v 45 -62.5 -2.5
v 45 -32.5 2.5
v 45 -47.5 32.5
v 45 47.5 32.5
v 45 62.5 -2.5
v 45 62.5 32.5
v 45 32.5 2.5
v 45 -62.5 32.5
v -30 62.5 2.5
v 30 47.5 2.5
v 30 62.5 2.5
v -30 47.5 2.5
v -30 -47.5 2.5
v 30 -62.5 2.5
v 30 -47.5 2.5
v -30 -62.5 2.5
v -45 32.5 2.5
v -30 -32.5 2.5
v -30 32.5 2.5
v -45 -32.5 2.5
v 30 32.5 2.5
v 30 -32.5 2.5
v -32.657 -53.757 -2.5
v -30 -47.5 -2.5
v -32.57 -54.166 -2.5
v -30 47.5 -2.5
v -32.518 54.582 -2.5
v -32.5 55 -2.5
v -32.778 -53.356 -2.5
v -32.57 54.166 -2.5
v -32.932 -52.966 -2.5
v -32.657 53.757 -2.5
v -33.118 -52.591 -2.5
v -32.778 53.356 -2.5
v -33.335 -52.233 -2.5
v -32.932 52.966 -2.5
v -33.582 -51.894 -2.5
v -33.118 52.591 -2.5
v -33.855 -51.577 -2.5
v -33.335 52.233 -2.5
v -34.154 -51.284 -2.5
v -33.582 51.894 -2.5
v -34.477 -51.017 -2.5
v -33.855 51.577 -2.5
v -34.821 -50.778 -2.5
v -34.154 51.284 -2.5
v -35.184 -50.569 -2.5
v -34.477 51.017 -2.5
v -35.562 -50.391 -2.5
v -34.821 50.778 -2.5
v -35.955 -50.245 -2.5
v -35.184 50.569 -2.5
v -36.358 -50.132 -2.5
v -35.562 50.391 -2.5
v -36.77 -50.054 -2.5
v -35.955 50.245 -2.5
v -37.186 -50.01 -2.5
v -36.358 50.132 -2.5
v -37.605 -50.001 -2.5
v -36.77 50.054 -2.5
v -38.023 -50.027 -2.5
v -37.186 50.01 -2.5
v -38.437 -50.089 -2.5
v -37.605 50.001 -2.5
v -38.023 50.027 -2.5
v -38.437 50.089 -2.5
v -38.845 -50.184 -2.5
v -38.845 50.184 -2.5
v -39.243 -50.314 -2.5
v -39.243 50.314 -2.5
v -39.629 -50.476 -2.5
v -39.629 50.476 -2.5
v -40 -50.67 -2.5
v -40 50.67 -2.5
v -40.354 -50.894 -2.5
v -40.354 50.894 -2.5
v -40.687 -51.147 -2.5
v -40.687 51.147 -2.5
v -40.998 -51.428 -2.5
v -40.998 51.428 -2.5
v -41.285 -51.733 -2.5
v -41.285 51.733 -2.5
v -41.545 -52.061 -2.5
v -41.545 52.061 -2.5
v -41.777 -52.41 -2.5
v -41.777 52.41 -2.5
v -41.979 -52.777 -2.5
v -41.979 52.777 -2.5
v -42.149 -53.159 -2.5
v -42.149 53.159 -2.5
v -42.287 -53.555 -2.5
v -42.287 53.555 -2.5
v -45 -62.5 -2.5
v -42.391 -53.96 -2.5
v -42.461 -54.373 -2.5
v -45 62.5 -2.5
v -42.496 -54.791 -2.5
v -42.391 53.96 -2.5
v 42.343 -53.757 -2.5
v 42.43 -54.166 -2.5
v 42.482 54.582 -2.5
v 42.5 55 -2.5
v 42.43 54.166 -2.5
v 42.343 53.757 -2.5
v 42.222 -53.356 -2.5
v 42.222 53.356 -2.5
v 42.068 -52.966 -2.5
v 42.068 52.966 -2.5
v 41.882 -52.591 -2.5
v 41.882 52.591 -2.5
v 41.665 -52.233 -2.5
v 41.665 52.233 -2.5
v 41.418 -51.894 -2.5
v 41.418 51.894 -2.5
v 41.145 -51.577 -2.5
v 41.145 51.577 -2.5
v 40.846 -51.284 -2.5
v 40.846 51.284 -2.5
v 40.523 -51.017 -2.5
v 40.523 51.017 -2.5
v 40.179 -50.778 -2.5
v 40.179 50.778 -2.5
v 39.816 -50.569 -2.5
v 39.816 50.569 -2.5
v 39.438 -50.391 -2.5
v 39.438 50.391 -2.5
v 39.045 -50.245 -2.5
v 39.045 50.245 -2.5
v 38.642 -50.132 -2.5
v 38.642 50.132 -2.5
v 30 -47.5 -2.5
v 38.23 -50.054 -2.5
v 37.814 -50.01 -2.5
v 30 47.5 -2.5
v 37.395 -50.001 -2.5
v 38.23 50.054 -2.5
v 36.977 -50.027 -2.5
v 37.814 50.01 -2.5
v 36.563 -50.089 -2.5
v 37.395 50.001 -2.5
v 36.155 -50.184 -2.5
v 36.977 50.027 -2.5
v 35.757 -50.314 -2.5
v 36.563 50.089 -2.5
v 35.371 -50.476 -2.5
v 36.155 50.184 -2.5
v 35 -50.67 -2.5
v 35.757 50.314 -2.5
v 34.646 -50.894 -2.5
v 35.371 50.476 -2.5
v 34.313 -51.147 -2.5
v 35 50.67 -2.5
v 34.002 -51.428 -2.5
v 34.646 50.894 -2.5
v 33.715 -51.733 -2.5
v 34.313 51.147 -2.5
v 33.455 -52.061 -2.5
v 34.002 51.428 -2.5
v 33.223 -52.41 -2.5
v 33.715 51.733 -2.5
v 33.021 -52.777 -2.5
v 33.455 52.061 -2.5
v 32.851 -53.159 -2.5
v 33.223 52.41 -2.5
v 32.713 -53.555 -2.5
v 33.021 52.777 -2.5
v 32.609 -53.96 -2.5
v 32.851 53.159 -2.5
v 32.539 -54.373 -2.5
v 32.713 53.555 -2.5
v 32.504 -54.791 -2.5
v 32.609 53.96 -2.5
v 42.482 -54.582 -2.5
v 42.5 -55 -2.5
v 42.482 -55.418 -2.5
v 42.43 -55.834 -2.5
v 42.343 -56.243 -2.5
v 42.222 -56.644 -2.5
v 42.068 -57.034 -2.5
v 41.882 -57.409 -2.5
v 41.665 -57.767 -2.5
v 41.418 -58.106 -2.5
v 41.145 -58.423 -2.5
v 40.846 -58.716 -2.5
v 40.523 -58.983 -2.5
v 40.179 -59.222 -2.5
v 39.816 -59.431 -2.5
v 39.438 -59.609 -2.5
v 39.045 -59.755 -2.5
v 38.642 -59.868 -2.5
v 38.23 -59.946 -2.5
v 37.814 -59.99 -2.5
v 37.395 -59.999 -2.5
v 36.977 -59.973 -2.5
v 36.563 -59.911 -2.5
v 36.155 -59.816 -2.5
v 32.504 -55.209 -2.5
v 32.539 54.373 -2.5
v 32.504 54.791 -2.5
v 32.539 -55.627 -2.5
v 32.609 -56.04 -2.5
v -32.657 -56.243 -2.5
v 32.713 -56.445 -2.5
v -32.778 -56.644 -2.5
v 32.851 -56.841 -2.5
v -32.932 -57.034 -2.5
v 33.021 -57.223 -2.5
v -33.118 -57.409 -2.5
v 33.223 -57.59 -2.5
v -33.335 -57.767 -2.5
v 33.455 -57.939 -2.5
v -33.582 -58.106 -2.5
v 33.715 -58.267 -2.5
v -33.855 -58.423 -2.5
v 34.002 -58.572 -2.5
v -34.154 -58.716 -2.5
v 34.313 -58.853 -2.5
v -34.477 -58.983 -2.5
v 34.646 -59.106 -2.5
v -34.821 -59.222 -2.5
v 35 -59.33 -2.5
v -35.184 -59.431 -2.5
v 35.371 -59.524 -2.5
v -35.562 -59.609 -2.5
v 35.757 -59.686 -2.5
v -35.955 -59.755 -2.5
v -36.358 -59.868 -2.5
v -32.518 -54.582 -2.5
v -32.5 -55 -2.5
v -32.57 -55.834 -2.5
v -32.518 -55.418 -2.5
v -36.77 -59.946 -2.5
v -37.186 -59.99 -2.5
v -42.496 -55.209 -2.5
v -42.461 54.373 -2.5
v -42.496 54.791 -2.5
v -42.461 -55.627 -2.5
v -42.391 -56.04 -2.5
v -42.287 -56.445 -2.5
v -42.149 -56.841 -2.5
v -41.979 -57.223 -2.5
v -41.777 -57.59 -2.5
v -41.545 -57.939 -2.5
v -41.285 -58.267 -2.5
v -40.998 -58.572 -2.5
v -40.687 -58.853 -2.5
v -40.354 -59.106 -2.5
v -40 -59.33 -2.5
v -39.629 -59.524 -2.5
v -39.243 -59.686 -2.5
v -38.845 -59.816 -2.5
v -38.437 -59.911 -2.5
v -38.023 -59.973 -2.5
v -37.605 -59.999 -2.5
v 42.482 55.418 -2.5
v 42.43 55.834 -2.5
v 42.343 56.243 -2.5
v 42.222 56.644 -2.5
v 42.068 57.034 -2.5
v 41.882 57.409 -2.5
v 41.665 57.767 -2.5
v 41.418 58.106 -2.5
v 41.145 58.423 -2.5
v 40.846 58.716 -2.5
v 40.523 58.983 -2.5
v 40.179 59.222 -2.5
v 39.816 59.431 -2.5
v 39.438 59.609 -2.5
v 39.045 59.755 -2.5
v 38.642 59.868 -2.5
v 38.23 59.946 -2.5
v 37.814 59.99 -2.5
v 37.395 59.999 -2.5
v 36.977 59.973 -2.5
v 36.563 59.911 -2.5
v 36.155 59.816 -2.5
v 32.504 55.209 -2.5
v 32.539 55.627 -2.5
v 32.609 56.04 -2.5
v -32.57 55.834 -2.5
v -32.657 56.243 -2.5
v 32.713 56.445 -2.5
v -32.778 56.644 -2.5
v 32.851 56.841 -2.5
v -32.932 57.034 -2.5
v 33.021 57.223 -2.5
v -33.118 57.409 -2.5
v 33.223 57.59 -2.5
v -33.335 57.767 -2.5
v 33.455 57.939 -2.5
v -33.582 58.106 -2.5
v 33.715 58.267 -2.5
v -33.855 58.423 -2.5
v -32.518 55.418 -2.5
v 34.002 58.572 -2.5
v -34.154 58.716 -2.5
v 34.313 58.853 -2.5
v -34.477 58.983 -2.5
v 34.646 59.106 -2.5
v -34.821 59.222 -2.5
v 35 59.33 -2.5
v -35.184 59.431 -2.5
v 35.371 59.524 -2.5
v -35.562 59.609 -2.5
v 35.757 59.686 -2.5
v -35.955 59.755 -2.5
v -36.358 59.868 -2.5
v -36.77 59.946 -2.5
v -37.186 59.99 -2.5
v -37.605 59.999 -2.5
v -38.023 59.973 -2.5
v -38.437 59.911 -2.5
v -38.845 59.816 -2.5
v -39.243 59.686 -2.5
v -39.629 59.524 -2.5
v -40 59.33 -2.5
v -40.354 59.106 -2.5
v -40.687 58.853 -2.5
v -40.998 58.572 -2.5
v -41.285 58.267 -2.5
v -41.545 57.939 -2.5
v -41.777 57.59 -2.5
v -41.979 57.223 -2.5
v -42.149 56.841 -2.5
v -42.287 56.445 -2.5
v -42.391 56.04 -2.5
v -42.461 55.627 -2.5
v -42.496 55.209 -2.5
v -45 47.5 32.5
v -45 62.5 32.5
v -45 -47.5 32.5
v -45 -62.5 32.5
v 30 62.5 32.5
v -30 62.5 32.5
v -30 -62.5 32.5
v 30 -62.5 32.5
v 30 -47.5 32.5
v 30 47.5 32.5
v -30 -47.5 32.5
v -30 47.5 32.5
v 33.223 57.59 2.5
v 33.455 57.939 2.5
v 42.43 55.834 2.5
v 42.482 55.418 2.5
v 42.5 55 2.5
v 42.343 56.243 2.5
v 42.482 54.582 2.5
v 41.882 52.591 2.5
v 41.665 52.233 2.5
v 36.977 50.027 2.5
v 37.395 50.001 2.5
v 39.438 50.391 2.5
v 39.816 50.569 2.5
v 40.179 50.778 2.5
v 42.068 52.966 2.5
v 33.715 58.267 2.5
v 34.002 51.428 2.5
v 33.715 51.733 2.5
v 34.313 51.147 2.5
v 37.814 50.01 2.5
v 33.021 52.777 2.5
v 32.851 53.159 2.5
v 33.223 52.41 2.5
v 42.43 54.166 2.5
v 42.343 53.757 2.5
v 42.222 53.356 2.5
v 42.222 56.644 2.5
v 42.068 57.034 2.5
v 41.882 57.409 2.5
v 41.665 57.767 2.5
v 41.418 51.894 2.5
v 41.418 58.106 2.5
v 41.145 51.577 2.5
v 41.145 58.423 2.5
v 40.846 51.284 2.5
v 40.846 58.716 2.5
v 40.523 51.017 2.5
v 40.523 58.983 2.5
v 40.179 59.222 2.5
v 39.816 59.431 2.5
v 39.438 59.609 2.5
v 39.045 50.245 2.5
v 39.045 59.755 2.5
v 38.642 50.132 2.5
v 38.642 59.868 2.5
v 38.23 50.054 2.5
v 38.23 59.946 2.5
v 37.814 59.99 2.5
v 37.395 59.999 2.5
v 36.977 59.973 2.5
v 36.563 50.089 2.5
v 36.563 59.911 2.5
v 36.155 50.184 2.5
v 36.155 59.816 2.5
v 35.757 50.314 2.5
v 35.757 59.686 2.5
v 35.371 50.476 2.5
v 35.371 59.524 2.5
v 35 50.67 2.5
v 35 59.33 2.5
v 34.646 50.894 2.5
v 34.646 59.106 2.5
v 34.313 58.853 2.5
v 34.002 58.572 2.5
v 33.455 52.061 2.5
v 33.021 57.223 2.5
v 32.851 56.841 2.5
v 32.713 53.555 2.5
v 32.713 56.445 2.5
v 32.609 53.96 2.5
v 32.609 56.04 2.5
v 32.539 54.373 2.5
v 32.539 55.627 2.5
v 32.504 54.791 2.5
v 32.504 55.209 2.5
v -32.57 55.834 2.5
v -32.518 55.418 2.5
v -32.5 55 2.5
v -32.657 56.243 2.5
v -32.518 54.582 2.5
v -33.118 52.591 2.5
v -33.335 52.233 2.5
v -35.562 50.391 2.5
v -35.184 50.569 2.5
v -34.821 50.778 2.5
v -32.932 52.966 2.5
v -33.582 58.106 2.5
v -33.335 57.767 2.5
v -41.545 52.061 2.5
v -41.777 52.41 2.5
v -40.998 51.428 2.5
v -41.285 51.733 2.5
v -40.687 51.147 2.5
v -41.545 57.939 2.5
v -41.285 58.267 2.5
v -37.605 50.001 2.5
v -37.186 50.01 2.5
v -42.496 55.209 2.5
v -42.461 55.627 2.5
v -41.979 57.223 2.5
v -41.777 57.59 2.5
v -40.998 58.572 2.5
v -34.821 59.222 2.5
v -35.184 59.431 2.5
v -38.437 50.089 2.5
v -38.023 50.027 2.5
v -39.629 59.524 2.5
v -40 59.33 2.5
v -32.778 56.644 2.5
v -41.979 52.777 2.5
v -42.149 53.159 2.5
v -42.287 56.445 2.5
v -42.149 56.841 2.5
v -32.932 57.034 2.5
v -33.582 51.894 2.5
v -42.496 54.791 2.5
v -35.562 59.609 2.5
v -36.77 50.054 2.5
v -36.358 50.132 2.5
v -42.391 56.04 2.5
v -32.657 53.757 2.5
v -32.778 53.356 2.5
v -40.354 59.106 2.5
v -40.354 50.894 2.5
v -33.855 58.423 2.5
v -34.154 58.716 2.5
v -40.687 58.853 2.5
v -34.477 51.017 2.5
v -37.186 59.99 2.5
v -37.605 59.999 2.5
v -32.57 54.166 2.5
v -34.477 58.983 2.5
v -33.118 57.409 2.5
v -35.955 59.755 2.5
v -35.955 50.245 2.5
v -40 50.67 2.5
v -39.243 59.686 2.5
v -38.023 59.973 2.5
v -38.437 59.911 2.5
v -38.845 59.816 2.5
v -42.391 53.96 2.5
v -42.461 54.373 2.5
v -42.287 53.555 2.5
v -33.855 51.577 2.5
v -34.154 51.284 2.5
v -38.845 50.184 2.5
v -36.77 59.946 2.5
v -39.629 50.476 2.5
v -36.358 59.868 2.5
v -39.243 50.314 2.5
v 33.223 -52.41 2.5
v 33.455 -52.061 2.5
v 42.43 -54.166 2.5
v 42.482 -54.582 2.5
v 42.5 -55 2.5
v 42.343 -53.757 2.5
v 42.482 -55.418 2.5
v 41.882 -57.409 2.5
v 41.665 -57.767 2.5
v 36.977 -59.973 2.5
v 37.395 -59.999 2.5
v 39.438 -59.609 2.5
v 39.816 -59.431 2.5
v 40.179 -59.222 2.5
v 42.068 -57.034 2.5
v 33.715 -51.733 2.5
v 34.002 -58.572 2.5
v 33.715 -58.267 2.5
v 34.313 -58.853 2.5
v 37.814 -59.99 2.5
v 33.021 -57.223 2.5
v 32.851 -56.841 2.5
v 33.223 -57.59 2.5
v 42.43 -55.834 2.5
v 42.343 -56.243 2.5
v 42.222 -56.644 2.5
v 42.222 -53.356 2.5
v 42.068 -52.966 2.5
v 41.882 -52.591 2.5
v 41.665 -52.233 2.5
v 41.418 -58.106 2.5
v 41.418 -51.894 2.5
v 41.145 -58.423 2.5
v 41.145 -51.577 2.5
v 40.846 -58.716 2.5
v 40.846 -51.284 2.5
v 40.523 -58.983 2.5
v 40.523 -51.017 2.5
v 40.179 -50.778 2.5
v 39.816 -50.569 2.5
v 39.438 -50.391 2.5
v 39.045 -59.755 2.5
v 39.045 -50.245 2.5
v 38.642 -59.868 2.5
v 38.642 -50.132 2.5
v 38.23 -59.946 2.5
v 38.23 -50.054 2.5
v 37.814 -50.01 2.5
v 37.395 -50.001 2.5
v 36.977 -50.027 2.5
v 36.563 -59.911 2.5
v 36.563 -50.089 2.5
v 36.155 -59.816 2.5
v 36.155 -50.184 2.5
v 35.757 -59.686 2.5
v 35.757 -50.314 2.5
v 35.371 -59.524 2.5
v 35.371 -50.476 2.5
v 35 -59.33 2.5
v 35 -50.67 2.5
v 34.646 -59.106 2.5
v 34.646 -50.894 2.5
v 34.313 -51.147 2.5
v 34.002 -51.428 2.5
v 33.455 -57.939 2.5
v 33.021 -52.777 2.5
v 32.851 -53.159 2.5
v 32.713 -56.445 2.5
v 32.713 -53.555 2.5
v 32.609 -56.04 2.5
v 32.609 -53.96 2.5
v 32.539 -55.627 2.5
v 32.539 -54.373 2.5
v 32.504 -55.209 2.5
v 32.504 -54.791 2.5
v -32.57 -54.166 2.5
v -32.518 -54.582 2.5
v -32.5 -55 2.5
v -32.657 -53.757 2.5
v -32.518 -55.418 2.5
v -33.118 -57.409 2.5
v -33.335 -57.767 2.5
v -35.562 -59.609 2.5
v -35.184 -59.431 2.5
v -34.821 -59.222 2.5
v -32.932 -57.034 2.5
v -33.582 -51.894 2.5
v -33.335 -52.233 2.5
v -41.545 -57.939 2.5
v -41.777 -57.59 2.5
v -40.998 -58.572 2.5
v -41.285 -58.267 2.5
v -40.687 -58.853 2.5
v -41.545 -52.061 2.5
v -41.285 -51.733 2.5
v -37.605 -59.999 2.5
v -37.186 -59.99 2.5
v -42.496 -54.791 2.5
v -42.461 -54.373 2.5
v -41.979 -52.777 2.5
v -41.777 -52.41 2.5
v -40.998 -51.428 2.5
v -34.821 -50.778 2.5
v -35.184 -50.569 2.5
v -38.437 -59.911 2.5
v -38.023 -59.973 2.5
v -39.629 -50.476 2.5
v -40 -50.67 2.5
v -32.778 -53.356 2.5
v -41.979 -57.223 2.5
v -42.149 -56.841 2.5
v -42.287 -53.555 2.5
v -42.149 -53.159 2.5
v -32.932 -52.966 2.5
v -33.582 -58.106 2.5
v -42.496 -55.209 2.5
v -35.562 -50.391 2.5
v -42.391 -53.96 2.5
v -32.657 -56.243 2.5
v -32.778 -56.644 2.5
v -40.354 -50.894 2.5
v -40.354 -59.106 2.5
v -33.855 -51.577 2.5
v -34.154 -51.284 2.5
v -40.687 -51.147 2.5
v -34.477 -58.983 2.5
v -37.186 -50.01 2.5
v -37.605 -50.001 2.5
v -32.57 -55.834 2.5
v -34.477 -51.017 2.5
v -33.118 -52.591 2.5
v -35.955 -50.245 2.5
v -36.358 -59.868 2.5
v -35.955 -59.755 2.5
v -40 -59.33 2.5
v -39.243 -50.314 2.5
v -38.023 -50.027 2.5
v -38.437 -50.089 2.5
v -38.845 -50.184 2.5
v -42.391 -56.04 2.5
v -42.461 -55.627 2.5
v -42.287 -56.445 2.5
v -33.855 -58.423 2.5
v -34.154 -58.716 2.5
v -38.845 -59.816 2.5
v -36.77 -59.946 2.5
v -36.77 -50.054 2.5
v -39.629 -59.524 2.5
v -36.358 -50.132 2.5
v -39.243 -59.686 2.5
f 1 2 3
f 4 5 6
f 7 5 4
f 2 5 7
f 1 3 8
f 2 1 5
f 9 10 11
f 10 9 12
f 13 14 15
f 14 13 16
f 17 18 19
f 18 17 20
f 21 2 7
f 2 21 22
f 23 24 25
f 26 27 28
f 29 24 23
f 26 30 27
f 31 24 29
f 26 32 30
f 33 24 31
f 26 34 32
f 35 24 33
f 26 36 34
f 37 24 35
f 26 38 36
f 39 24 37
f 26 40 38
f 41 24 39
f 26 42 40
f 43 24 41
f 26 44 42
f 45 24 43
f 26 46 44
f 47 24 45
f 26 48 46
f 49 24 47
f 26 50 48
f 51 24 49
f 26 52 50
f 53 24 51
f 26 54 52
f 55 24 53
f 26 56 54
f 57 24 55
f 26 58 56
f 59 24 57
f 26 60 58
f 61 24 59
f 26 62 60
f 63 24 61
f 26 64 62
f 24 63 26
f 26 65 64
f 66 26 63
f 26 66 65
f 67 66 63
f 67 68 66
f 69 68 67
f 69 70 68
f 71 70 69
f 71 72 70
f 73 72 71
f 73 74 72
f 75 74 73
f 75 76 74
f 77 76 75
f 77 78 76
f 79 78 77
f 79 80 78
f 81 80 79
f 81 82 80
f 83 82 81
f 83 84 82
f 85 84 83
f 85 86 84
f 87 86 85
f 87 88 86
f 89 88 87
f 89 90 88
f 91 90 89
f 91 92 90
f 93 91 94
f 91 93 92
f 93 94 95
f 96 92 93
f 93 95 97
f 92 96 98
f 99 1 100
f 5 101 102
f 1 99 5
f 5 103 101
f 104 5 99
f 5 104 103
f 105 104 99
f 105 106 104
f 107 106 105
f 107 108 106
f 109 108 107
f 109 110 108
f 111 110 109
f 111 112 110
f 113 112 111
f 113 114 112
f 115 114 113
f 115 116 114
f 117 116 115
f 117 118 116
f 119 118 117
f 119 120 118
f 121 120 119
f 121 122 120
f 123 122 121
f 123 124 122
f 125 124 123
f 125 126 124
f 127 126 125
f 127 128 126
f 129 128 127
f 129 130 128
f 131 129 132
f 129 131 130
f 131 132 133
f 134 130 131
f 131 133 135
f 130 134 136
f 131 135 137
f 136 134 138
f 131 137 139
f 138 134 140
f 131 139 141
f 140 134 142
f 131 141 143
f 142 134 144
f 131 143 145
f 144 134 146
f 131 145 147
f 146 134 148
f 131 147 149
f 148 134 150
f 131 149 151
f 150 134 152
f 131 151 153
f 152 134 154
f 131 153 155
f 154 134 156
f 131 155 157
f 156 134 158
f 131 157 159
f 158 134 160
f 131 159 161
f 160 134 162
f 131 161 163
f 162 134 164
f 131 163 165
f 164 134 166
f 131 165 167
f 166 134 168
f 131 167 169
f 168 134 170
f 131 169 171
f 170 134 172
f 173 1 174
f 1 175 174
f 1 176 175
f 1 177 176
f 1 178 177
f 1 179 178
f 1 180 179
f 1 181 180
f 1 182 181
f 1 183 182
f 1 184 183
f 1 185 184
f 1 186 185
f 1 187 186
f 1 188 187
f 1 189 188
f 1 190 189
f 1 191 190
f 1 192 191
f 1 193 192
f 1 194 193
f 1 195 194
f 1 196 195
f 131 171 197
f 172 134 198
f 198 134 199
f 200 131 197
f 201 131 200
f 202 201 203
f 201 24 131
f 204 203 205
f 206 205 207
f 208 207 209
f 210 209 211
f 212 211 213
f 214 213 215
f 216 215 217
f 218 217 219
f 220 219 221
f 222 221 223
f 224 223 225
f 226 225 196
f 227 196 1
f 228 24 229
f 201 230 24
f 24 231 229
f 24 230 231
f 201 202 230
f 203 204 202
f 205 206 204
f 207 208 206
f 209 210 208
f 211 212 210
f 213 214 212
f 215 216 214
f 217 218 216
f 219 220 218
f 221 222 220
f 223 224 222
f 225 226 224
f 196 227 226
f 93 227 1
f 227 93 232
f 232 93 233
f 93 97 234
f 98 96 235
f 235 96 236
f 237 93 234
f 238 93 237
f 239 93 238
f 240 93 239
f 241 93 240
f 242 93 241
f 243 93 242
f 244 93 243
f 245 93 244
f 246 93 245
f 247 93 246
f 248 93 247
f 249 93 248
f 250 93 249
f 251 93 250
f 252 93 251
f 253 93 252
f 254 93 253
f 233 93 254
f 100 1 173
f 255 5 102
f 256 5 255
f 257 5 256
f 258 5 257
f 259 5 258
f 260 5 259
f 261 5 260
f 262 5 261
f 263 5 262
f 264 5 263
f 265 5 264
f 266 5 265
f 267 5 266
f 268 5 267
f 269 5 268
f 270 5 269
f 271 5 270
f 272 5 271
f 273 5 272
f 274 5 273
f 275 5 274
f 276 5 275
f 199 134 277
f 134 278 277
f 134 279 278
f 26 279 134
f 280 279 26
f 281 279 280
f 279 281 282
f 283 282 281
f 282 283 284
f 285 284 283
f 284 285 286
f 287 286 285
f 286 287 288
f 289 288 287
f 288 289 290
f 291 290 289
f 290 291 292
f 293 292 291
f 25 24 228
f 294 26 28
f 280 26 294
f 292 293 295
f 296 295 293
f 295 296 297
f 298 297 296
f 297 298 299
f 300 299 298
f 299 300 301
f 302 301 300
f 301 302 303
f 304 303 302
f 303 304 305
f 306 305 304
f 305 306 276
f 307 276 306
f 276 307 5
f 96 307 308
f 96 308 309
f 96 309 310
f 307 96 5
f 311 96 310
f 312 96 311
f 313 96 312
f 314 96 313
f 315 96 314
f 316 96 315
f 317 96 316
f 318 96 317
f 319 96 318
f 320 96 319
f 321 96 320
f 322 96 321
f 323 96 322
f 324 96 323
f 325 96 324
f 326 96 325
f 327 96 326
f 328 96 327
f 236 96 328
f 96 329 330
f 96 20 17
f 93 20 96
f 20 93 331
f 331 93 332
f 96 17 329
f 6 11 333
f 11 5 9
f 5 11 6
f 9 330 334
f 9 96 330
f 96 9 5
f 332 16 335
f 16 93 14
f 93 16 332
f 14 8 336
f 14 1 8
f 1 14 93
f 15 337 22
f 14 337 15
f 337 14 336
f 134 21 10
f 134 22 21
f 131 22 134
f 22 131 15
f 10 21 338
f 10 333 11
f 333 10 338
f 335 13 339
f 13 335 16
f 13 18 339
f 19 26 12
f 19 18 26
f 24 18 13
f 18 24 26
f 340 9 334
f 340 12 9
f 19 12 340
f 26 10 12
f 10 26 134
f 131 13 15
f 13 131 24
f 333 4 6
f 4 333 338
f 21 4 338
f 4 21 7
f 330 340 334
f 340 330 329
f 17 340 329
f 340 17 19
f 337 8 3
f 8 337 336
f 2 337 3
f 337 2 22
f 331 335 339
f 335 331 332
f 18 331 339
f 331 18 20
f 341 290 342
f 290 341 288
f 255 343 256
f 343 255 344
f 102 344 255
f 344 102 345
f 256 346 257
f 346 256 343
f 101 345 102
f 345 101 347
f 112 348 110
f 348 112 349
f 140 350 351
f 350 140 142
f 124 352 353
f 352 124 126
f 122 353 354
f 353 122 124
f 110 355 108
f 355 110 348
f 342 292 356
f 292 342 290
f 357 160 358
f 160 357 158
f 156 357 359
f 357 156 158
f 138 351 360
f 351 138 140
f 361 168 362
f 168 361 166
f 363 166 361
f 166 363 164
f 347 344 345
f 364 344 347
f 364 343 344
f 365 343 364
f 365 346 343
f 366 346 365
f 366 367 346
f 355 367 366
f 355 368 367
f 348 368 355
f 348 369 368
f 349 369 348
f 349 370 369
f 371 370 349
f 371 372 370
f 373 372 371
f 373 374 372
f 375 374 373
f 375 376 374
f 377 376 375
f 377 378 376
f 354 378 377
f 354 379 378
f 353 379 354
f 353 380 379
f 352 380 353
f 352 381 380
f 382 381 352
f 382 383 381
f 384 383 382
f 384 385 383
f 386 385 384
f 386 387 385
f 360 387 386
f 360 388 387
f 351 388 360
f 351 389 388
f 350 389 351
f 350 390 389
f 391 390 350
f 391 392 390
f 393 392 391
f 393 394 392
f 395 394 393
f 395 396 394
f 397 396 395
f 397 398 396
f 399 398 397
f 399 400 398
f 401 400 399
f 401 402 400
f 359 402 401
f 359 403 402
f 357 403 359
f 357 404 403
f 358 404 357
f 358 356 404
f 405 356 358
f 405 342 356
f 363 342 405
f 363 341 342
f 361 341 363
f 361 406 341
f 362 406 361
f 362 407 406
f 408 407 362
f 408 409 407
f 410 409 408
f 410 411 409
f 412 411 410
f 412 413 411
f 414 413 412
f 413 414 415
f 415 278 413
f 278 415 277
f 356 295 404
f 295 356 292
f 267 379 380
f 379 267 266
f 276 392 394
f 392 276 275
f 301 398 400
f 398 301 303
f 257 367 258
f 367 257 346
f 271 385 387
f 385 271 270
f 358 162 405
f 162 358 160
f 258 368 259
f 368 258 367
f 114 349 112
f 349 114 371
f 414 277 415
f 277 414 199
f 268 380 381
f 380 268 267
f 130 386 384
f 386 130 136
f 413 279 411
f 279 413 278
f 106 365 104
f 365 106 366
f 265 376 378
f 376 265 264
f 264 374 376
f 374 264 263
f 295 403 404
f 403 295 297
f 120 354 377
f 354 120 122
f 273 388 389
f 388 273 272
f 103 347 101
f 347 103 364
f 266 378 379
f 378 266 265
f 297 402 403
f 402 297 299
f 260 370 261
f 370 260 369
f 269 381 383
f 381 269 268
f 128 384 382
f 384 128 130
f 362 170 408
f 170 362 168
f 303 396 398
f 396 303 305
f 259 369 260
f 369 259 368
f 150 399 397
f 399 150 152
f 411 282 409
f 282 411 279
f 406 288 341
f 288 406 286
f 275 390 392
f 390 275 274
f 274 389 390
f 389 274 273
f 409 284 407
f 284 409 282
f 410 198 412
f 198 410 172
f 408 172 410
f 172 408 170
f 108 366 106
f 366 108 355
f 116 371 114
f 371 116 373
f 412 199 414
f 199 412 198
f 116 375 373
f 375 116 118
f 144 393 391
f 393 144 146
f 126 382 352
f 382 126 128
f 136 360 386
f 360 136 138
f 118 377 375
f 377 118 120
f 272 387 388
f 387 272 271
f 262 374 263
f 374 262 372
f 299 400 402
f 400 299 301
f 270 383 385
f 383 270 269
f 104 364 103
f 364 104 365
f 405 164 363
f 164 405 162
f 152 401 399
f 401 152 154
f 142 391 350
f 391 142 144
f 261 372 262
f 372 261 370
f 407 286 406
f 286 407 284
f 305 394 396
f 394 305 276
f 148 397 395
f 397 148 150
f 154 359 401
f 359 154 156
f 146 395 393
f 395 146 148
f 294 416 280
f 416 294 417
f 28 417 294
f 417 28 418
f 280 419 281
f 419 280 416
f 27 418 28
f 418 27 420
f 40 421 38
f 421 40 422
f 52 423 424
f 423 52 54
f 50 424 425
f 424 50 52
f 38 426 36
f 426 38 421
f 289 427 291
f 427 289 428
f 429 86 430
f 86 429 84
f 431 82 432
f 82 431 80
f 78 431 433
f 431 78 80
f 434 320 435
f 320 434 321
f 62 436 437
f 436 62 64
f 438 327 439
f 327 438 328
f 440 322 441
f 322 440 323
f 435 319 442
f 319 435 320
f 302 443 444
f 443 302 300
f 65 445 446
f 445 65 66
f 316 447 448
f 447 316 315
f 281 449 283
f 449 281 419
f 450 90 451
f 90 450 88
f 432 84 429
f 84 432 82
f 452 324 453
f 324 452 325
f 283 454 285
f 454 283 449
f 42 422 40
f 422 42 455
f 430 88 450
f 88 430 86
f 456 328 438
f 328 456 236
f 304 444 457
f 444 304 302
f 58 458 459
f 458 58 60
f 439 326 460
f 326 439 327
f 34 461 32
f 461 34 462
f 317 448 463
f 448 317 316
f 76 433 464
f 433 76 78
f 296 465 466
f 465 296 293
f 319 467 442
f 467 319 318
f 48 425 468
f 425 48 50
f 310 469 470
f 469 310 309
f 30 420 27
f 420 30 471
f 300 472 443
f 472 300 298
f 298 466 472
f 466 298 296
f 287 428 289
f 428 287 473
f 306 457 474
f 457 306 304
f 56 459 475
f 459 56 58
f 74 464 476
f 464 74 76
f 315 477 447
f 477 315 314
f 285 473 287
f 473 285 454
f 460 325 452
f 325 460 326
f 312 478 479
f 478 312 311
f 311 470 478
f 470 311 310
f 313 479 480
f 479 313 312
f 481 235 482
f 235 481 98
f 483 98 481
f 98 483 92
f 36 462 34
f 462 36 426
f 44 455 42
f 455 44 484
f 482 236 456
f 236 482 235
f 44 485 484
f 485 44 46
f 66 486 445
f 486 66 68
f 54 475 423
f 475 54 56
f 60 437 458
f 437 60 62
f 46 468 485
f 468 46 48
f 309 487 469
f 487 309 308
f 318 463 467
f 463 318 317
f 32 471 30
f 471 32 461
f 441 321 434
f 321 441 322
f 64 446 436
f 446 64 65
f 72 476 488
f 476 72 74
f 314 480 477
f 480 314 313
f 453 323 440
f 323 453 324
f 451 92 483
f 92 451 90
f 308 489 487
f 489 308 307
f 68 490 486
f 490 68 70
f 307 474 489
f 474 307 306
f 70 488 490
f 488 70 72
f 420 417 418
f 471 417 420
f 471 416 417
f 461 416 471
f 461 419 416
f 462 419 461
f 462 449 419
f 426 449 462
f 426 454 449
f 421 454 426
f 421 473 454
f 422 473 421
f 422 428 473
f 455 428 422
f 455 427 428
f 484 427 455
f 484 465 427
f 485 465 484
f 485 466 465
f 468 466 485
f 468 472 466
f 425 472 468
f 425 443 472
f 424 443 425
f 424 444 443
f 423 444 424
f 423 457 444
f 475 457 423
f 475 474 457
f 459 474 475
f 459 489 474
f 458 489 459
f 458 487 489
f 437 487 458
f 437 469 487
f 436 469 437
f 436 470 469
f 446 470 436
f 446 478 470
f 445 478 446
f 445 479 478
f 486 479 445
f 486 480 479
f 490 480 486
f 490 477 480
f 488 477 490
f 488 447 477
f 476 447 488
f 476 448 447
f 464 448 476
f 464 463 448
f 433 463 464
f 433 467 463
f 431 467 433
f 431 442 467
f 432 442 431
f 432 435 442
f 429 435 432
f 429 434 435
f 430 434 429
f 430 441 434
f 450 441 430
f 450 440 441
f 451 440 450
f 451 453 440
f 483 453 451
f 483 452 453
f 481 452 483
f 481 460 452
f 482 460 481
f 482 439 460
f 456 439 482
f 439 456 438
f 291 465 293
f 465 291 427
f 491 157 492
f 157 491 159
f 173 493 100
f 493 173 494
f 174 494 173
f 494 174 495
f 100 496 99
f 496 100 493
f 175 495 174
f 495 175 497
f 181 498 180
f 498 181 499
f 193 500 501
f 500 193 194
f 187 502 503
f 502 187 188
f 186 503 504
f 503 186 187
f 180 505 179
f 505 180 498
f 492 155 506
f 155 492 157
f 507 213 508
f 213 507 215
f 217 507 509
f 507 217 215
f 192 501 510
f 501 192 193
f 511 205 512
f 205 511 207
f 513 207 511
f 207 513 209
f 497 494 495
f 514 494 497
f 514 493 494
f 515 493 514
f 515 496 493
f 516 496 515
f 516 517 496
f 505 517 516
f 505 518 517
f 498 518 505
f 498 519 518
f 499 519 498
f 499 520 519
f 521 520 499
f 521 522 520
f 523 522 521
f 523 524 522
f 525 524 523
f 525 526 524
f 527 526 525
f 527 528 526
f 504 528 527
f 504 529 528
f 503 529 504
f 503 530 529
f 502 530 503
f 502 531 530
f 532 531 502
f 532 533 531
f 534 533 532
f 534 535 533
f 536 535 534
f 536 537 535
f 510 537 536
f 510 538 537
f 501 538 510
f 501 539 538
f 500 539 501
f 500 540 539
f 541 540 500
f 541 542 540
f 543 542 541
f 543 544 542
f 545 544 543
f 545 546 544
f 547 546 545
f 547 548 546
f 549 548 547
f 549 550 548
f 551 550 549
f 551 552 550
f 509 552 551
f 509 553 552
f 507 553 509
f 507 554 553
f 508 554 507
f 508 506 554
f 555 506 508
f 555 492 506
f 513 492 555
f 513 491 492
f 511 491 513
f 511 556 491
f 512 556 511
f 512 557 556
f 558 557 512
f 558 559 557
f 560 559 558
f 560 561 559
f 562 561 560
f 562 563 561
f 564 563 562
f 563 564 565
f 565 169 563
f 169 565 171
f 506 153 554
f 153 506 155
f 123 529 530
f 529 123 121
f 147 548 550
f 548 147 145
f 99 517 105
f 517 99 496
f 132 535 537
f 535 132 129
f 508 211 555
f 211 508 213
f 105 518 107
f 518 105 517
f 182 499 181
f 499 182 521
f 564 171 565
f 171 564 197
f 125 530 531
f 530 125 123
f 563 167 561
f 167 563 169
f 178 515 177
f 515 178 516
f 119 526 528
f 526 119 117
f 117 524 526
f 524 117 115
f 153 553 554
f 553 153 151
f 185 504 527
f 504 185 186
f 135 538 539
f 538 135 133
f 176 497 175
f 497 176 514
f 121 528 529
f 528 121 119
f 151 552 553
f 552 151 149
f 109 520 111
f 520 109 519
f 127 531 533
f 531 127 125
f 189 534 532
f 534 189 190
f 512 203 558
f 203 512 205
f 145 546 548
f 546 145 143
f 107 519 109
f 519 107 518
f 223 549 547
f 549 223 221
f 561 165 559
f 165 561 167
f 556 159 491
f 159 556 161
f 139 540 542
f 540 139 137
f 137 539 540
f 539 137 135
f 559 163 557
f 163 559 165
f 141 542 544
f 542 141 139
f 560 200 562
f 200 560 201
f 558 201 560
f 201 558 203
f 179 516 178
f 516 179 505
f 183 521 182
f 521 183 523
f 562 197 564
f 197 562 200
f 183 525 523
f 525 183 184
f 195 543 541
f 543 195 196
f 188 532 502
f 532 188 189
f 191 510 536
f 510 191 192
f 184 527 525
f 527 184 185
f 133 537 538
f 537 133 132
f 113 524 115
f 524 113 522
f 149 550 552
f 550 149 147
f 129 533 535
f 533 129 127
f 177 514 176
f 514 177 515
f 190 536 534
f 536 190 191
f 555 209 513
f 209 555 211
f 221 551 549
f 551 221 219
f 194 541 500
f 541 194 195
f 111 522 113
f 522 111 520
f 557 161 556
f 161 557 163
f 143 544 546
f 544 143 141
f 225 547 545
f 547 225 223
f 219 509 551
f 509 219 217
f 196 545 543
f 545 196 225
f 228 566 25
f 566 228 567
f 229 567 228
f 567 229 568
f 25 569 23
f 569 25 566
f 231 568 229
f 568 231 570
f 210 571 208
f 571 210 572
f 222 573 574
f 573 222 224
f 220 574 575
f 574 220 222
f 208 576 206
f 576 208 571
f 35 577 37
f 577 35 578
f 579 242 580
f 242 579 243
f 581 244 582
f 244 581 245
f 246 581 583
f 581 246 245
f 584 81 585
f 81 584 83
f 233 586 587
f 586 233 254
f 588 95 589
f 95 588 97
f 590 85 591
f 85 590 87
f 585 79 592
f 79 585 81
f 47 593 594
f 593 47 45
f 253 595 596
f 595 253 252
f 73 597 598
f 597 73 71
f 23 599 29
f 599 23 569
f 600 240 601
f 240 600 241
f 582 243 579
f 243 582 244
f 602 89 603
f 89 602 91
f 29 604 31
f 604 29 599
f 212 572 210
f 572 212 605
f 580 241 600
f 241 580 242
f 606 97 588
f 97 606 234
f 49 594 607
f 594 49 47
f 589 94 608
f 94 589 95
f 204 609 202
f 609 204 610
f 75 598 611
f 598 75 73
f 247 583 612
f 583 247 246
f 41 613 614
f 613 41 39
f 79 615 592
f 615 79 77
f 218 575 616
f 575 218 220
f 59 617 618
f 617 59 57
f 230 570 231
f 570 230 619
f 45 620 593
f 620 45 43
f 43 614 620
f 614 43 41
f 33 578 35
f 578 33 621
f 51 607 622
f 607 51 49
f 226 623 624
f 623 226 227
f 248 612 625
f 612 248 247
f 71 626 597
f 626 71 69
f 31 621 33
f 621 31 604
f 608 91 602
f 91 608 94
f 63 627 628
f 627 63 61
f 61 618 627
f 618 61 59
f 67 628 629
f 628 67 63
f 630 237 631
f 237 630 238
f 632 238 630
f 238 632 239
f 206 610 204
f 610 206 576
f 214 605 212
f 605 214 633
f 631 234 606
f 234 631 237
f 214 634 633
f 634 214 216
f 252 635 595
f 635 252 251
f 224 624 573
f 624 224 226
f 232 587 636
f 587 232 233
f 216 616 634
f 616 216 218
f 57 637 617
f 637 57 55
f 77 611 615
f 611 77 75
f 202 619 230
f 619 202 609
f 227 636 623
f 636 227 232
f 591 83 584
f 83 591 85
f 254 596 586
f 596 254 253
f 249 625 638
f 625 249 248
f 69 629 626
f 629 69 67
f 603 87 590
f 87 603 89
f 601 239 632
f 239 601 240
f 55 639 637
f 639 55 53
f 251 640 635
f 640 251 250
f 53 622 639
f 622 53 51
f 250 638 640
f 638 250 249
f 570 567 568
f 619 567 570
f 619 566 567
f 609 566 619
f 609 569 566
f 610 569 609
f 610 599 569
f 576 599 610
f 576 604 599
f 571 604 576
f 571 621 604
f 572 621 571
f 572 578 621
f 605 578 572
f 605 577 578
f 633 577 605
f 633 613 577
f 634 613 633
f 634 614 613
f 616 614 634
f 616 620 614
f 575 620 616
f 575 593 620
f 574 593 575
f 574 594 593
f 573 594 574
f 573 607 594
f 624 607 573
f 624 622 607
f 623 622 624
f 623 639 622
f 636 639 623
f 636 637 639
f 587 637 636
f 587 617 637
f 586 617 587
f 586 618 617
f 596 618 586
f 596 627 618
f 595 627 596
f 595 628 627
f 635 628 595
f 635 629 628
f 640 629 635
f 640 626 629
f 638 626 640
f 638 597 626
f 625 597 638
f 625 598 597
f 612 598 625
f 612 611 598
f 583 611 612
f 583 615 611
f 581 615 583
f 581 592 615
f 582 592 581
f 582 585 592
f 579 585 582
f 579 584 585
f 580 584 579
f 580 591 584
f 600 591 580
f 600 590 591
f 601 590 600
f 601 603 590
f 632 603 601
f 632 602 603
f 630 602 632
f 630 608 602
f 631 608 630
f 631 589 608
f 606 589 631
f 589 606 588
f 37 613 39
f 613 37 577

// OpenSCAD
/*
 * Stand for my amplifier (Fosi Audio V3) to make it rest
 * comfortably on my desk lifted over my monitor stand.
 */

// PARAMETERS

frame_x = 90; // mm
frame_y = 125; // mm
frame_z = 5; // mm
frame_thickness = 15; // mm

indent_offset = 2.5; // mm
indent_diameter = 10; // mm
indent_height = 5; // mm

feet_height = 30; // mm

// MODEL

y_off = (frame_y - frame_thickness) * 0.5;
x_off = (frame_x - frame_thickness) * 0.5;

difference() {

union() {
    // frame
    difference() {
        cube([frame_x, frame_y, frame_z], true);
        cube([frame_x - (2 * frame_thickness), frame_y - (2 * frame_thickness), frame_z], true);
    }
    
    // feet
    slide_off = frame_thickness * 0.5;
    hull() {
        translate([x_off, y_off - slide_off, frame_z * 0.5]) {
            cube([frame_thickness, frame_thickness * 2, 0.0001], true);
        }
        translate([x_off, y_off, (feet_height + frame_z) * 0.5]) {
            cube([frame_thickness, frame_thickness, feet_height], true);
        }
    }
    hull() {
        translate([-x_off, y_off - slide_off, frame_z * 0.5]) {
            cube([frame_thickness, frame_thickness * 2, 0.0001], true);
        }
        translate([-x_off, y_off, (feet_height + frame_z) * 0.5]) {
            cube([frame_thickness, frame_thickness, feet_height], true);
        }
    }
    hull() {
        translate([x_off, - (y_off - slide_off), frame_z * 0.5]) {
            cube([frame_thickness, frame_thickness * 2, 0.0001], true);
        }
        translate([x_off, -y_off, (feet_height + frame_z) * 0.5]) {
            cube([frame_thickness, frame_thickness, feet_height], true);
        }
    }
    hull() {
        translate([-x_off, - (y_off - slide_off), frame_z * 0.5]) {
            cube([frame_thickness, frame_thickness * 2, 0.0001], true);
        }
        translate([-x_off, -y_off, (feet_height + frame_z) * 0.5]) {
            cube([frame_thickness, frame_thickness, feet_height], true);
        }
    }
}


// indent
$fn = 75;
union() {
    translate([x_off, y_off, 0]) {
        cylinder(h = indent_height, d = indent_diameter, center = true);
    }
    translate([-x_off, y_off, 0]) {
        cylinder(h = indent_height, d = indent_diameter, center = true);
    }
    translate([x_off, -y_off, 0]) {
        cylinder(h = indent_height, d = indent_diameter, center = true);
    }
    translate([-x_off, -y_off, 0]) {
        cylinder(h = indent_height, d = indent_diameter, center = true);
    }
}

}
